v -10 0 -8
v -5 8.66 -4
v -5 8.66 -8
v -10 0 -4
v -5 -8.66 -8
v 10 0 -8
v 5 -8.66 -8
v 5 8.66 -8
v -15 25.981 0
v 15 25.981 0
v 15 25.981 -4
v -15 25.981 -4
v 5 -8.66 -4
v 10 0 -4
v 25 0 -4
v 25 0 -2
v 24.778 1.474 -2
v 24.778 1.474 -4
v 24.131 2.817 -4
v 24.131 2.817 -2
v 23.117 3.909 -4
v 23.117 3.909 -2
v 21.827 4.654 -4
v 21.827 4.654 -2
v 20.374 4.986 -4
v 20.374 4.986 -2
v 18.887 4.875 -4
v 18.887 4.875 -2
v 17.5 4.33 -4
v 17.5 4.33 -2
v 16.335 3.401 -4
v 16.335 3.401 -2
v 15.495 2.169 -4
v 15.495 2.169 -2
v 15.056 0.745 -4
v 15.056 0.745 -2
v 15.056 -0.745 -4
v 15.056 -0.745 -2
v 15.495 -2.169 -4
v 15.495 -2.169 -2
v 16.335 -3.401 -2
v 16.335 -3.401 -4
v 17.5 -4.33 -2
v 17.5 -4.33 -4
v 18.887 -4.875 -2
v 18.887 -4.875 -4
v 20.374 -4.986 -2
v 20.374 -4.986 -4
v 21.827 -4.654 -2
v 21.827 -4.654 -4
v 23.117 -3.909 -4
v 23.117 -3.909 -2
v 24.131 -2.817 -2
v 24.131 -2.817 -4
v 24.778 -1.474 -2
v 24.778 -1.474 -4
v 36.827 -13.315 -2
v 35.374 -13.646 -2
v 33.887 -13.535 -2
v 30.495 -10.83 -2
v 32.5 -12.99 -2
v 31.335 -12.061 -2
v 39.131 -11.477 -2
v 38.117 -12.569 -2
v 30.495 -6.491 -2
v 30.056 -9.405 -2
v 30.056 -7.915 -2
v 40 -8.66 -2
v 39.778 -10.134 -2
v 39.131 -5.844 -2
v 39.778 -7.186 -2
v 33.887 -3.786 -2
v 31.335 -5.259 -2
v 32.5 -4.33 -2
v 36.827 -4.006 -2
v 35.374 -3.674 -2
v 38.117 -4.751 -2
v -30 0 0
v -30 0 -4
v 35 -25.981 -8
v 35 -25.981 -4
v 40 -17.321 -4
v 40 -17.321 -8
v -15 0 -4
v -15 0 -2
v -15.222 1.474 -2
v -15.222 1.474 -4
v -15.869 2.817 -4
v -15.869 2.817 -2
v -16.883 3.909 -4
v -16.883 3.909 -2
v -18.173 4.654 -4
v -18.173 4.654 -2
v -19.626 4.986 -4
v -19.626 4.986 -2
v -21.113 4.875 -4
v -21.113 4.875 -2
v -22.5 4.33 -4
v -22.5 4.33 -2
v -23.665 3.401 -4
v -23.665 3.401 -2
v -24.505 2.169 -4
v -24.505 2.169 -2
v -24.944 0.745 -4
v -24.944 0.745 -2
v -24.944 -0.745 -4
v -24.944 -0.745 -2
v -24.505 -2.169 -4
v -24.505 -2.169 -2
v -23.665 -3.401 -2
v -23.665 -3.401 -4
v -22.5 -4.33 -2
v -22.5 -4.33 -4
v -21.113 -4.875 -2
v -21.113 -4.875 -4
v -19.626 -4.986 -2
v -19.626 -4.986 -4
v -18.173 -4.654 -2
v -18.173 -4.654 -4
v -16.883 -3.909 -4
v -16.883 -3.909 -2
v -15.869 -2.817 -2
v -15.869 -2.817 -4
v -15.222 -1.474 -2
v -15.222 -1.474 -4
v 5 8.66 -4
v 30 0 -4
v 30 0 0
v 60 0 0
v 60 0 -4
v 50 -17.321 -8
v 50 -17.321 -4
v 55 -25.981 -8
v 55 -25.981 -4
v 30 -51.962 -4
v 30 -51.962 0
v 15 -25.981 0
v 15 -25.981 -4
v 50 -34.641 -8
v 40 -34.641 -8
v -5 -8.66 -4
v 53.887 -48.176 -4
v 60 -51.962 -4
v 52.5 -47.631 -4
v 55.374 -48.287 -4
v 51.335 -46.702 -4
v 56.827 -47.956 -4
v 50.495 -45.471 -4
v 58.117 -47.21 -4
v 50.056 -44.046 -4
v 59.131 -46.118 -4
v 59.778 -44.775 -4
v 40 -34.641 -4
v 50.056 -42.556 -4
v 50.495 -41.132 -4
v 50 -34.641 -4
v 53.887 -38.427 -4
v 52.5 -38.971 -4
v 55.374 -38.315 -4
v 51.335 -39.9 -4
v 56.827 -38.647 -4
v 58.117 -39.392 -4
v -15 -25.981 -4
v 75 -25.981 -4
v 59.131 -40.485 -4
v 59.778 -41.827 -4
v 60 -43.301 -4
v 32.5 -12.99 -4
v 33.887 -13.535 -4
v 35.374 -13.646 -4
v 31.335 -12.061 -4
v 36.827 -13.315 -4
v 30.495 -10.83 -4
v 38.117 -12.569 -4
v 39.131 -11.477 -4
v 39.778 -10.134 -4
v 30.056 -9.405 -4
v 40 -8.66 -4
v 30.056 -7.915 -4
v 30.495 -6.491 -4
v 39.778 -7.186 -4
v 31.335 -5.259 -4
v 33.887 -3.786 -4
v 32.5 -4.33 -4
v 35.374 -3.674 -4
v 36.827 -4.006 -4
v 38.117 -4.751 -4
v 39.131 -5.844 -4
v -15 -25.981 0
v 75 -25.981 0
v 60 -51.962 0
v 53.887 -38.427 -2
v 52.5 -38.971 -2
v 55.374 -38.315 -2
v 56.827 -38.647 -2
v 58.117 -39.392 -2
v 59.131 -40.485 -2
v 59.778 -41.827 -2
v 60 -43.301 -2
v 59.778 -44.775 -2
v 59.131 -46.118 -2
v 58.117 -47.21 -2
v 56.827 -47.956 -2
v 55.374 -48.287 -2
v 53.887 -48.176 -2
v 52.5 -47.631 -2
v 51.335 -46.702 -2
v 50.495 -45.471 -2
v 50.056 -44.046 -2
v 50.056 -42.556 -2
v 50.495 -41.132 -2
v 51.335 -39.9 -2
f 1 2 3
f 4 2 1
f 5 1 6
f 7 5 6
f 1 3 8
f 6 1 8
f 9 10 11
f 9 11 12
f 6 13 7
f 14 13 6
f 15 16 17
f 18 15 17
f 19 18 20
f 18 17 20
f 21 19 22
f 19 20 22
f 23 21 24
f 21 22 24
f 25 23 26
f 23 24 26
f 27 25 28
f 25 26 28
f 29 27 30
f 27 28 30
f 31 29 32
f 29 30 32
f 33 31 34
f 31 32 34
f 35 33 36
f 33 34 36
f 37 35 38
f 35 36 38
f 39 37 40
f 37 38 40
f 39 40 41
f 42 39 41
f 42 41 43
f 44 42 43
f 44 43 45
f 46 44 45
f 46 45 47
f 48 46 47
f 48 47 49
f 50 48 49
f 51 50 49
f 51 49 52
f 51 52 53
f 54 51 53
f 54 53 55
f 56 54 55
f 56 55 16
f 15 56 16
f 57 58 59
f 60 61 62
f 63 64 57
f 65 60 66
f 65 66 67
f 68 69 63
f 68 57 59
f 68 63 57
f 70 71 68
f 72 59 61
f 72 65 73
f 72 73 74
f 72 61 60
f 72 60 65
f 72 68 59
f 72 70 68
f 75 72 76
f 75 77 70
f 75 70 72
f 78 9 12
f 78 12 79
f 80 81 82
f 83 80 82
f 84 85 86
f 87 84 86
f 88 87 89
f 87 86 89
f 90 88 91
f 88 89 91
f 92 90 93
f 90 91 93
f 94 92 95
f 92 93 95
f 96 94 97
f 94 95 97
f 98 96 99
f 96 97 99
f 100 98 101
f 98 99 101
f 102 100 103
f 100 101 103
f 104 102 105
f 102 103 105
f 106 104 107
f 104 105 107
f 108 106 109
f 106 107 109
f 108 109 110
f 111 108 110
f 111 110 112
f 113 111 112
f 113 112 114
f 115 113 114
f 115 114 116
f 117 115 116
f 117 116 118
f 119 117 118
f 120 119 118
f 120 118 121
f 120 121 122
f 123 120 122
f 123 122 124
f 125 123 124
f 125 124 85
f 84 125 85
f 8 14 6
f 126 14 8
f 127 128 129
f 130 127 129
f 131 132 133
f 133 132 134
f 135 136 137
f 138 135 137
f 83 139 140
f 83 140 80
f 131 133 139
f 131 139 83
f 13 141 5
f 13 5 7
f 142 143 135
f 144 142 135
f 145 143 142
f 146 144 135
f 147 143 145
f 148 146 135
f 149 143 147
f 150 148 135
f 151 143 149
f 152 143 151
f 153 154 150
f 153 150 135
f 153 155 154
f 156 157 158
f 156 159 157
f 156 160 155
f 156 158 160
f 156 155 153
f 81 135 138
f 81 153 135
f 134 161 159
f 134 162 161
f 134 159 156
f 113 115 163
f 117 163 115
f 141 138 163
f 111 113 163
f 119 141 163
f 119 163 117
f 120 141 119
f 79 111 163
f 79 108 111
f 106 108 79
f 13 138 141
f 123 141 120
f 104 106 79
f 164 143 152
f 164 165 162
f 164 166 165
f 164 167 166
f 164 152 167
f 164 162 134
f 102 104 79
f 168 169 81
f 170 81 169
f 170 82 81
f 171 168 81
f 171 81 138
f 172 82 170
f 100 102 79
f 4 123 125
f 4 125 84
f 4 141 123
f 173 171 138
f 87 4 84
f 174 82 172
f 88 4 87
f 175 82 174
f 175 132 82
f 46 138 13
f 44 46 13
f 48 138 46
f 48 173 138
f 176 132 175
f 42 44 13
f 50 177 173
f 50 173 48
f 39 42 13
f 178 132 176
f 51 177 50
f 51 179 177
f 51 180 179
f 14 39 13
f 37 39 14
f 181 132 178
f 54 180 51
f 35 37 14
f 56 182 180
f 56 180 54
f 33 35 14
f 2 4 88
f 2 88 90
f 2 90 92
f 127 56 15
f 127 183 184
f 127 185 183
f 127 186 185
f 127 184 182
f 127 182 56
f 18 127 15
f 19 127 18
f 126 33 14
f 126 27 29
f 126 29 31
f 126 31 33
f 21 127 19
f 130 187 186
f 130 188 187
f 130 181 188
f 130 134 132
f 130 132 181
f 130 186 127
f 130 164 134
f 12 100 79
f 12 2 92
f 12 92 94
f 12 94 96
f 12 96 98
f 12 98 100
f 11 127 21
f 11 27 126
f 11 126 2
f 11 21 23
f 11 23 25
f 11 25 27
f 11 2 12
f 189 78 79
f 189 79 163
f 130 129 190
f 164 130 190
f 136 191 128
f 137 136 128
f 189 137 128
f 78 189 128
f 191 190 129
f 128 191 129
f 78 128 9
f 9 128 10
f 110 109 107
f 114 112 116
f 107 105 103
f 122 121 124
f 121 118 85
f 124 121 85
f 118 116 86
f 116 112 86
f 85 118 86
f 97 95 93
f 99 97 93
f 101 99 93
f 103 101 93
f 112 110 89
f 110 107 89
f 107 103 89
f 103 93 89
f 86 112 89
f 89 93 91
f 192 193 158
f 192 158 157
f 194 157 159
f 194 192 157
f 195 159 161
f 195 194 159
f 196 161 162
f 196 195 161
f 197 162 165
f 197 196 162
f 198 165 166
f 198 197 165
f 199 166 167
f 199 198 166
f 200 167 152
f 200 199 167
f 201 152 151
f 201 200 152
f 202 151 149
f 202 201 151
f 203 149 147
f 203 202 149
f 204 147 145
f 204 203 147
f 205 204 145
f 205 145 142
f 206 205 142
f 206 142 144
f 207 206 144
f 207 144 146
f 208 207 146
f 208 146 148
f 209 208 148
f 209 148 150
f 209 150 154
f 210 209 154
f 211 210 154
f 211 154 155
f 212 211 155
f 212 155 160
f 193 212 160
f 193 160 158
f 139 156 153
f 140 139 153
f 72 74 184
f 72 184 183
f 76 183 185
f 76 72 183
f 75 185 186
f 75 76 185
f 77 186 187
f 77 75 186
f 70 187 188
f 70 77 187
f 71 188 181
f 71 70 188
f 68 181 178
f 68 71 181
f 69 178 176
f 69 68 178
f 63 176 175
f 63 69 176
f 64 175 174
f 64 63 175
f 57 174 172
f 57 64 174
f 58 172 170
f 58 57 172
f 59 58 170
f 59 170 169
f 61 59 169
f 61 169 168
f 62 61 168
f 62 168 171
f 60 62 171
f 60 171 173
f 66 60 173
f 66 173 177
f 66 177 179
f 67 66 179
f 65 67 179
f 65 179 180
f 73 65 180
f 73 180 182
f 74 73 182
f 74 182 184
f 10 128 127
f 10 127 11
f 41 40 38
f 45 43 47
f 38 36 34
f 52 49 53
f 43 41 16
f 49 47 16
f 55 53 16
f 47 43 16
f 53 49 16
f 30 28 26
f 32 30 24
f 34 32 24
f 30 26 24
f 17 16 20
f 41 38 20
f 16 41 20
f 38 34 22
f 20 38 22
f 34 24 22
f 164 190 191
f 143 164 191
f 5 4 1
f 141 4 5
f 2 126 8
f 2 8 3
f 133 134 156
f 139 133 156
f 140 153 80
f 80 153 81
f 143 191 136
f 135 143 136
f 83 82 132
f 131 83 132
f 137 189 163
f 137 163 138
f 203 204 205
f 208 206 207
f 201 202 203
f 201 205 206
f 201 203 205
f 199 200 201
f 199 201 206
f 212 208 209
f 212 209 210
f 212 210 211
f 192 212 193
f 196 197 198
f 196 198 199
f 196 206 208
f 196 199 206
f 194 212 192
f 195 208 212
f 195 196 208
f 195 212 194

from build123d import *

# Parameters (mm, degrees)
SKETCH1_R           = 5
BOSS_EXTRUDE1_DEPTH = 4
BOSS_EXTRUDE2_DEPTH = 8
SKETCH1_5_R         = 5
BOSS_EXTRUDE3_DEPTH = 2


with BuildPart() as part:
    # Sketch1 → Boss-Extrude1 (new body)
    with BuildSketch(Plane.XY):
        Polygon((-30, 0), (-15, -25.980762114), (15, -25.980762114), (30, 0), (15, 25.980762114), (-15, 25.980762114), align=None)
        Polygon((5, -8.660254038), (-5, -8.660254038), (-10, 0), (-5, 8.660254038), (5, 8.660254038), (10, 0), align=None, mode=Mode.SUBTRACT)
        with Locations((-20, 0)):
            Circle(SKETCH1_R, mode=Mode.SUBTRACT)
        with Locations((20, 0)):
            Circle(SKETCH1_R, mode=Mode.SUBTRACT)
    extrude(amount=-BOSS_EXTRUDE1_DEPTH)

    # Sketch1<4> → Boss-Extrude2 (add)
    with BuildSketch(Plane.XY):
        Polygon((-10, 0), (-5, -8.660254038), (5, -8.660254038), (10, 0), (5, 8.660254038), (-5, 8.660254038), align=None)
    extrude(amount=-BOSS_EXTRUDE2_DEPTH)

    # Sketch1<5> → Boss-Extrude3 (add)
    with BuildSketch(Plane.XY):
        with Locations((-20, 0)):
            Circle(SKETCH1_5_R)
        with Locations((20, 0)):
            Circle(SKETCH1_5_R)
    extrude(amount=-BOSS_EXTRUDE3_DEPTH)

    # Mirror1: part across plane


with BuildPart() as part_1:
    add(part.part)
    add(part.part.mirror(Plane(origin=(22.5, -12.990381057, -4), x_dir=(0, 0, 1), z_dir=(0.8660254037844386, -0.5000000000000003, 0))))


solid = part_1.part
